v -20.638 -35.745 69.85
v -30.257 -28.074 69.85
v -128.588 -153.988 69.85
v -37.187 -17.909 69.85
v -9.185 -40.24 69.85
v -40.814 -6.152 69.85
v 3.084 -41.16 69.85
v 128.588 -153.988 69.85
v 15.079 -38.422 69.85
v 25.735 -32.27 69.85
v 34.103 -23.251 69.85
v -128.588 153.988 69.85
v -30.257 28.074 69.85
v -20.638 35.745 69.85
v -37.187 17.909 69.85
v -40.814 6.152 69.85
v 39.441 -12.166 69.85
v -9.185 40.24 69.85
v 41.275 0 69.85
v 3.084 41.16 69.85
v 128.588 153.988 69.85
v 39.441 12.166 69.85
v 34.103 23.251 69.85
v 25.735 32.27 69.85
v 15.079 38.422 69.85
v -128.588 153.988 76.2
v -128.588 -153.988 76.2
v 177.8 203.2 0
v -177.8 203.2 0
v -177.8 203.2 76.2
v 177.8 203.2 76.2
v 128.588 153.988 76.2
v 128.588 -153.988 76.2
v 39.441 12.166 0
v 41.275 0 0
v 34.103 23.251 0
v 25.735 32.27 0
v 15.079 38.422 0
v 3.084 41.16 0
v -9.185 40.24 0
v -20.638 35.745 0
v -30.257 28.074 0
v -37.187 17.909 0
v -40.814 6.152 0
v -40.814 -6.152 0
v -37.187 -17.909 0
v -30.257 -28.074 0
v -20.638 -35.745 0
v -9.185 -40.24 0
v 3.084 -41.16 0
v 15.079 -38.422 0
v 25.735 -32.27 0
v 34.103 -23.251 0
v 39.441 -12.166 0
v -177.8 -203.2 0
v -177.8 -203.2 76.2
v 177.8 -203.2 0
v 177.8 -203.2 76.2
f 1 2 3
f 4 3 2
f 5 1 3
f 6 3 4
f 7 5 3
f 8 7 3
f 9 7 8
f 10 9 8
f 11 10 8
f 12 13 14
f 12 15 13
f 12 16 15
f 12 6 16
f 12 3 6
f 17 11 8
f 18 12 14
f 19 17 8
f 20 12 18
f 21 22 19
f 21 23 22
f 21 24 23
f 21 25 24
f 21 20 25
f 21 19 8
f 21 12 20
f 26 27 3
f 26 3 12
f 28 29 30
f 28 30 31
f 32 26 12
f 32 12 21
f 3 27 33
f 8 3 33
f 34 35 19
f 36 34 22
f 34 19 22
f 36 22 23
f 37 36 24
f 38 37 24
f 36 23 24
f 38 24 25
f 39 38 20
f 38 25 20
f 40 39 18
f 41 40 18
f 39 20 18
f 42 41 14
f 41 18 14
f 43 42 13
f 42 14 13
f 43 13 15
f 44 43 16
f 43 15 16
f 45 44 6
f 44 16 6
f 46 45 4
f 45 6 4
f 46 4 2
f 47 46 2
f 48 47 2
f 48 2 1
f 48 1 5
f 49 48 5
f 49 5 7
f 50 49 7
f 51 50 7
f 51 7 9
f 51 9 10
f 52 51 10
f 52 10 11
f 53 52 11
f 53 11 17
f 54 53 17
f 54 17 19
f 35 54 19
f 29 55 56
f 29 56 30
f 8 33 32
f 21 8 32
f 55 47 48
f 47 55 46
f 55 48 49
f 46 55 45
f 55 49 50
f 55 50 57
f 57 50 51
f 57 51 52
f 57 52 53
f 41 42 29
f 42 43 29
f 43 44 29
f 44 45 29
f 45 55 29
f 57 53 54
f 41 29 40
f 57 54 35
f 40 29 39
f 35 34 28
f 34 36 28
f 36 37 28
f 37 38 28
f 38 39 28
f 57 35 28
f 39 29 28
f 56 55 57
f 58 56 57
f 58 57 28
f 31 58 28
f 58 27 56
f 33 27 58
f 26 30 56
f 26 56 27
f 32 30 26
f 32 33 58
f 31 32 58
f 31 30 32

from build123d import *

# Parameters (mm, degrees)
F0_W     = 355.6
F0_H     = 406.4
F1_DEPTH = 76.2
F2_R     = 41.275
F3_DEPTH = 76.201
F4_W     = 257.175
F4_H     = 307.975
F5_DEPTH = 6.35


with BuildPart() as f1:
    # F0 (on Top) → F1 (new body)
    with BuildSketch(Plane.XY):
        Rectangle(F0_W, F0_H)
    extrude(amount=F1_DEPTH)

    # F2 (on face) → F3 (cut, through all)
    with BuildSketch(Plane.XY.offset(76.2)):
        Circle(F2_R)
    extrude(amount=-F3_DEPTH, mode=Mode.SUBTRACT)

    # F4 (on face) → F5 (cut)
    with BuildSketch(Plane.XY.offset(76.2)):
        Rectangle(F4_W, F4_H)
    extrude(amount=-F5_DEPTH, mode=Mode.SUBTRACT)


solid = f1.part
